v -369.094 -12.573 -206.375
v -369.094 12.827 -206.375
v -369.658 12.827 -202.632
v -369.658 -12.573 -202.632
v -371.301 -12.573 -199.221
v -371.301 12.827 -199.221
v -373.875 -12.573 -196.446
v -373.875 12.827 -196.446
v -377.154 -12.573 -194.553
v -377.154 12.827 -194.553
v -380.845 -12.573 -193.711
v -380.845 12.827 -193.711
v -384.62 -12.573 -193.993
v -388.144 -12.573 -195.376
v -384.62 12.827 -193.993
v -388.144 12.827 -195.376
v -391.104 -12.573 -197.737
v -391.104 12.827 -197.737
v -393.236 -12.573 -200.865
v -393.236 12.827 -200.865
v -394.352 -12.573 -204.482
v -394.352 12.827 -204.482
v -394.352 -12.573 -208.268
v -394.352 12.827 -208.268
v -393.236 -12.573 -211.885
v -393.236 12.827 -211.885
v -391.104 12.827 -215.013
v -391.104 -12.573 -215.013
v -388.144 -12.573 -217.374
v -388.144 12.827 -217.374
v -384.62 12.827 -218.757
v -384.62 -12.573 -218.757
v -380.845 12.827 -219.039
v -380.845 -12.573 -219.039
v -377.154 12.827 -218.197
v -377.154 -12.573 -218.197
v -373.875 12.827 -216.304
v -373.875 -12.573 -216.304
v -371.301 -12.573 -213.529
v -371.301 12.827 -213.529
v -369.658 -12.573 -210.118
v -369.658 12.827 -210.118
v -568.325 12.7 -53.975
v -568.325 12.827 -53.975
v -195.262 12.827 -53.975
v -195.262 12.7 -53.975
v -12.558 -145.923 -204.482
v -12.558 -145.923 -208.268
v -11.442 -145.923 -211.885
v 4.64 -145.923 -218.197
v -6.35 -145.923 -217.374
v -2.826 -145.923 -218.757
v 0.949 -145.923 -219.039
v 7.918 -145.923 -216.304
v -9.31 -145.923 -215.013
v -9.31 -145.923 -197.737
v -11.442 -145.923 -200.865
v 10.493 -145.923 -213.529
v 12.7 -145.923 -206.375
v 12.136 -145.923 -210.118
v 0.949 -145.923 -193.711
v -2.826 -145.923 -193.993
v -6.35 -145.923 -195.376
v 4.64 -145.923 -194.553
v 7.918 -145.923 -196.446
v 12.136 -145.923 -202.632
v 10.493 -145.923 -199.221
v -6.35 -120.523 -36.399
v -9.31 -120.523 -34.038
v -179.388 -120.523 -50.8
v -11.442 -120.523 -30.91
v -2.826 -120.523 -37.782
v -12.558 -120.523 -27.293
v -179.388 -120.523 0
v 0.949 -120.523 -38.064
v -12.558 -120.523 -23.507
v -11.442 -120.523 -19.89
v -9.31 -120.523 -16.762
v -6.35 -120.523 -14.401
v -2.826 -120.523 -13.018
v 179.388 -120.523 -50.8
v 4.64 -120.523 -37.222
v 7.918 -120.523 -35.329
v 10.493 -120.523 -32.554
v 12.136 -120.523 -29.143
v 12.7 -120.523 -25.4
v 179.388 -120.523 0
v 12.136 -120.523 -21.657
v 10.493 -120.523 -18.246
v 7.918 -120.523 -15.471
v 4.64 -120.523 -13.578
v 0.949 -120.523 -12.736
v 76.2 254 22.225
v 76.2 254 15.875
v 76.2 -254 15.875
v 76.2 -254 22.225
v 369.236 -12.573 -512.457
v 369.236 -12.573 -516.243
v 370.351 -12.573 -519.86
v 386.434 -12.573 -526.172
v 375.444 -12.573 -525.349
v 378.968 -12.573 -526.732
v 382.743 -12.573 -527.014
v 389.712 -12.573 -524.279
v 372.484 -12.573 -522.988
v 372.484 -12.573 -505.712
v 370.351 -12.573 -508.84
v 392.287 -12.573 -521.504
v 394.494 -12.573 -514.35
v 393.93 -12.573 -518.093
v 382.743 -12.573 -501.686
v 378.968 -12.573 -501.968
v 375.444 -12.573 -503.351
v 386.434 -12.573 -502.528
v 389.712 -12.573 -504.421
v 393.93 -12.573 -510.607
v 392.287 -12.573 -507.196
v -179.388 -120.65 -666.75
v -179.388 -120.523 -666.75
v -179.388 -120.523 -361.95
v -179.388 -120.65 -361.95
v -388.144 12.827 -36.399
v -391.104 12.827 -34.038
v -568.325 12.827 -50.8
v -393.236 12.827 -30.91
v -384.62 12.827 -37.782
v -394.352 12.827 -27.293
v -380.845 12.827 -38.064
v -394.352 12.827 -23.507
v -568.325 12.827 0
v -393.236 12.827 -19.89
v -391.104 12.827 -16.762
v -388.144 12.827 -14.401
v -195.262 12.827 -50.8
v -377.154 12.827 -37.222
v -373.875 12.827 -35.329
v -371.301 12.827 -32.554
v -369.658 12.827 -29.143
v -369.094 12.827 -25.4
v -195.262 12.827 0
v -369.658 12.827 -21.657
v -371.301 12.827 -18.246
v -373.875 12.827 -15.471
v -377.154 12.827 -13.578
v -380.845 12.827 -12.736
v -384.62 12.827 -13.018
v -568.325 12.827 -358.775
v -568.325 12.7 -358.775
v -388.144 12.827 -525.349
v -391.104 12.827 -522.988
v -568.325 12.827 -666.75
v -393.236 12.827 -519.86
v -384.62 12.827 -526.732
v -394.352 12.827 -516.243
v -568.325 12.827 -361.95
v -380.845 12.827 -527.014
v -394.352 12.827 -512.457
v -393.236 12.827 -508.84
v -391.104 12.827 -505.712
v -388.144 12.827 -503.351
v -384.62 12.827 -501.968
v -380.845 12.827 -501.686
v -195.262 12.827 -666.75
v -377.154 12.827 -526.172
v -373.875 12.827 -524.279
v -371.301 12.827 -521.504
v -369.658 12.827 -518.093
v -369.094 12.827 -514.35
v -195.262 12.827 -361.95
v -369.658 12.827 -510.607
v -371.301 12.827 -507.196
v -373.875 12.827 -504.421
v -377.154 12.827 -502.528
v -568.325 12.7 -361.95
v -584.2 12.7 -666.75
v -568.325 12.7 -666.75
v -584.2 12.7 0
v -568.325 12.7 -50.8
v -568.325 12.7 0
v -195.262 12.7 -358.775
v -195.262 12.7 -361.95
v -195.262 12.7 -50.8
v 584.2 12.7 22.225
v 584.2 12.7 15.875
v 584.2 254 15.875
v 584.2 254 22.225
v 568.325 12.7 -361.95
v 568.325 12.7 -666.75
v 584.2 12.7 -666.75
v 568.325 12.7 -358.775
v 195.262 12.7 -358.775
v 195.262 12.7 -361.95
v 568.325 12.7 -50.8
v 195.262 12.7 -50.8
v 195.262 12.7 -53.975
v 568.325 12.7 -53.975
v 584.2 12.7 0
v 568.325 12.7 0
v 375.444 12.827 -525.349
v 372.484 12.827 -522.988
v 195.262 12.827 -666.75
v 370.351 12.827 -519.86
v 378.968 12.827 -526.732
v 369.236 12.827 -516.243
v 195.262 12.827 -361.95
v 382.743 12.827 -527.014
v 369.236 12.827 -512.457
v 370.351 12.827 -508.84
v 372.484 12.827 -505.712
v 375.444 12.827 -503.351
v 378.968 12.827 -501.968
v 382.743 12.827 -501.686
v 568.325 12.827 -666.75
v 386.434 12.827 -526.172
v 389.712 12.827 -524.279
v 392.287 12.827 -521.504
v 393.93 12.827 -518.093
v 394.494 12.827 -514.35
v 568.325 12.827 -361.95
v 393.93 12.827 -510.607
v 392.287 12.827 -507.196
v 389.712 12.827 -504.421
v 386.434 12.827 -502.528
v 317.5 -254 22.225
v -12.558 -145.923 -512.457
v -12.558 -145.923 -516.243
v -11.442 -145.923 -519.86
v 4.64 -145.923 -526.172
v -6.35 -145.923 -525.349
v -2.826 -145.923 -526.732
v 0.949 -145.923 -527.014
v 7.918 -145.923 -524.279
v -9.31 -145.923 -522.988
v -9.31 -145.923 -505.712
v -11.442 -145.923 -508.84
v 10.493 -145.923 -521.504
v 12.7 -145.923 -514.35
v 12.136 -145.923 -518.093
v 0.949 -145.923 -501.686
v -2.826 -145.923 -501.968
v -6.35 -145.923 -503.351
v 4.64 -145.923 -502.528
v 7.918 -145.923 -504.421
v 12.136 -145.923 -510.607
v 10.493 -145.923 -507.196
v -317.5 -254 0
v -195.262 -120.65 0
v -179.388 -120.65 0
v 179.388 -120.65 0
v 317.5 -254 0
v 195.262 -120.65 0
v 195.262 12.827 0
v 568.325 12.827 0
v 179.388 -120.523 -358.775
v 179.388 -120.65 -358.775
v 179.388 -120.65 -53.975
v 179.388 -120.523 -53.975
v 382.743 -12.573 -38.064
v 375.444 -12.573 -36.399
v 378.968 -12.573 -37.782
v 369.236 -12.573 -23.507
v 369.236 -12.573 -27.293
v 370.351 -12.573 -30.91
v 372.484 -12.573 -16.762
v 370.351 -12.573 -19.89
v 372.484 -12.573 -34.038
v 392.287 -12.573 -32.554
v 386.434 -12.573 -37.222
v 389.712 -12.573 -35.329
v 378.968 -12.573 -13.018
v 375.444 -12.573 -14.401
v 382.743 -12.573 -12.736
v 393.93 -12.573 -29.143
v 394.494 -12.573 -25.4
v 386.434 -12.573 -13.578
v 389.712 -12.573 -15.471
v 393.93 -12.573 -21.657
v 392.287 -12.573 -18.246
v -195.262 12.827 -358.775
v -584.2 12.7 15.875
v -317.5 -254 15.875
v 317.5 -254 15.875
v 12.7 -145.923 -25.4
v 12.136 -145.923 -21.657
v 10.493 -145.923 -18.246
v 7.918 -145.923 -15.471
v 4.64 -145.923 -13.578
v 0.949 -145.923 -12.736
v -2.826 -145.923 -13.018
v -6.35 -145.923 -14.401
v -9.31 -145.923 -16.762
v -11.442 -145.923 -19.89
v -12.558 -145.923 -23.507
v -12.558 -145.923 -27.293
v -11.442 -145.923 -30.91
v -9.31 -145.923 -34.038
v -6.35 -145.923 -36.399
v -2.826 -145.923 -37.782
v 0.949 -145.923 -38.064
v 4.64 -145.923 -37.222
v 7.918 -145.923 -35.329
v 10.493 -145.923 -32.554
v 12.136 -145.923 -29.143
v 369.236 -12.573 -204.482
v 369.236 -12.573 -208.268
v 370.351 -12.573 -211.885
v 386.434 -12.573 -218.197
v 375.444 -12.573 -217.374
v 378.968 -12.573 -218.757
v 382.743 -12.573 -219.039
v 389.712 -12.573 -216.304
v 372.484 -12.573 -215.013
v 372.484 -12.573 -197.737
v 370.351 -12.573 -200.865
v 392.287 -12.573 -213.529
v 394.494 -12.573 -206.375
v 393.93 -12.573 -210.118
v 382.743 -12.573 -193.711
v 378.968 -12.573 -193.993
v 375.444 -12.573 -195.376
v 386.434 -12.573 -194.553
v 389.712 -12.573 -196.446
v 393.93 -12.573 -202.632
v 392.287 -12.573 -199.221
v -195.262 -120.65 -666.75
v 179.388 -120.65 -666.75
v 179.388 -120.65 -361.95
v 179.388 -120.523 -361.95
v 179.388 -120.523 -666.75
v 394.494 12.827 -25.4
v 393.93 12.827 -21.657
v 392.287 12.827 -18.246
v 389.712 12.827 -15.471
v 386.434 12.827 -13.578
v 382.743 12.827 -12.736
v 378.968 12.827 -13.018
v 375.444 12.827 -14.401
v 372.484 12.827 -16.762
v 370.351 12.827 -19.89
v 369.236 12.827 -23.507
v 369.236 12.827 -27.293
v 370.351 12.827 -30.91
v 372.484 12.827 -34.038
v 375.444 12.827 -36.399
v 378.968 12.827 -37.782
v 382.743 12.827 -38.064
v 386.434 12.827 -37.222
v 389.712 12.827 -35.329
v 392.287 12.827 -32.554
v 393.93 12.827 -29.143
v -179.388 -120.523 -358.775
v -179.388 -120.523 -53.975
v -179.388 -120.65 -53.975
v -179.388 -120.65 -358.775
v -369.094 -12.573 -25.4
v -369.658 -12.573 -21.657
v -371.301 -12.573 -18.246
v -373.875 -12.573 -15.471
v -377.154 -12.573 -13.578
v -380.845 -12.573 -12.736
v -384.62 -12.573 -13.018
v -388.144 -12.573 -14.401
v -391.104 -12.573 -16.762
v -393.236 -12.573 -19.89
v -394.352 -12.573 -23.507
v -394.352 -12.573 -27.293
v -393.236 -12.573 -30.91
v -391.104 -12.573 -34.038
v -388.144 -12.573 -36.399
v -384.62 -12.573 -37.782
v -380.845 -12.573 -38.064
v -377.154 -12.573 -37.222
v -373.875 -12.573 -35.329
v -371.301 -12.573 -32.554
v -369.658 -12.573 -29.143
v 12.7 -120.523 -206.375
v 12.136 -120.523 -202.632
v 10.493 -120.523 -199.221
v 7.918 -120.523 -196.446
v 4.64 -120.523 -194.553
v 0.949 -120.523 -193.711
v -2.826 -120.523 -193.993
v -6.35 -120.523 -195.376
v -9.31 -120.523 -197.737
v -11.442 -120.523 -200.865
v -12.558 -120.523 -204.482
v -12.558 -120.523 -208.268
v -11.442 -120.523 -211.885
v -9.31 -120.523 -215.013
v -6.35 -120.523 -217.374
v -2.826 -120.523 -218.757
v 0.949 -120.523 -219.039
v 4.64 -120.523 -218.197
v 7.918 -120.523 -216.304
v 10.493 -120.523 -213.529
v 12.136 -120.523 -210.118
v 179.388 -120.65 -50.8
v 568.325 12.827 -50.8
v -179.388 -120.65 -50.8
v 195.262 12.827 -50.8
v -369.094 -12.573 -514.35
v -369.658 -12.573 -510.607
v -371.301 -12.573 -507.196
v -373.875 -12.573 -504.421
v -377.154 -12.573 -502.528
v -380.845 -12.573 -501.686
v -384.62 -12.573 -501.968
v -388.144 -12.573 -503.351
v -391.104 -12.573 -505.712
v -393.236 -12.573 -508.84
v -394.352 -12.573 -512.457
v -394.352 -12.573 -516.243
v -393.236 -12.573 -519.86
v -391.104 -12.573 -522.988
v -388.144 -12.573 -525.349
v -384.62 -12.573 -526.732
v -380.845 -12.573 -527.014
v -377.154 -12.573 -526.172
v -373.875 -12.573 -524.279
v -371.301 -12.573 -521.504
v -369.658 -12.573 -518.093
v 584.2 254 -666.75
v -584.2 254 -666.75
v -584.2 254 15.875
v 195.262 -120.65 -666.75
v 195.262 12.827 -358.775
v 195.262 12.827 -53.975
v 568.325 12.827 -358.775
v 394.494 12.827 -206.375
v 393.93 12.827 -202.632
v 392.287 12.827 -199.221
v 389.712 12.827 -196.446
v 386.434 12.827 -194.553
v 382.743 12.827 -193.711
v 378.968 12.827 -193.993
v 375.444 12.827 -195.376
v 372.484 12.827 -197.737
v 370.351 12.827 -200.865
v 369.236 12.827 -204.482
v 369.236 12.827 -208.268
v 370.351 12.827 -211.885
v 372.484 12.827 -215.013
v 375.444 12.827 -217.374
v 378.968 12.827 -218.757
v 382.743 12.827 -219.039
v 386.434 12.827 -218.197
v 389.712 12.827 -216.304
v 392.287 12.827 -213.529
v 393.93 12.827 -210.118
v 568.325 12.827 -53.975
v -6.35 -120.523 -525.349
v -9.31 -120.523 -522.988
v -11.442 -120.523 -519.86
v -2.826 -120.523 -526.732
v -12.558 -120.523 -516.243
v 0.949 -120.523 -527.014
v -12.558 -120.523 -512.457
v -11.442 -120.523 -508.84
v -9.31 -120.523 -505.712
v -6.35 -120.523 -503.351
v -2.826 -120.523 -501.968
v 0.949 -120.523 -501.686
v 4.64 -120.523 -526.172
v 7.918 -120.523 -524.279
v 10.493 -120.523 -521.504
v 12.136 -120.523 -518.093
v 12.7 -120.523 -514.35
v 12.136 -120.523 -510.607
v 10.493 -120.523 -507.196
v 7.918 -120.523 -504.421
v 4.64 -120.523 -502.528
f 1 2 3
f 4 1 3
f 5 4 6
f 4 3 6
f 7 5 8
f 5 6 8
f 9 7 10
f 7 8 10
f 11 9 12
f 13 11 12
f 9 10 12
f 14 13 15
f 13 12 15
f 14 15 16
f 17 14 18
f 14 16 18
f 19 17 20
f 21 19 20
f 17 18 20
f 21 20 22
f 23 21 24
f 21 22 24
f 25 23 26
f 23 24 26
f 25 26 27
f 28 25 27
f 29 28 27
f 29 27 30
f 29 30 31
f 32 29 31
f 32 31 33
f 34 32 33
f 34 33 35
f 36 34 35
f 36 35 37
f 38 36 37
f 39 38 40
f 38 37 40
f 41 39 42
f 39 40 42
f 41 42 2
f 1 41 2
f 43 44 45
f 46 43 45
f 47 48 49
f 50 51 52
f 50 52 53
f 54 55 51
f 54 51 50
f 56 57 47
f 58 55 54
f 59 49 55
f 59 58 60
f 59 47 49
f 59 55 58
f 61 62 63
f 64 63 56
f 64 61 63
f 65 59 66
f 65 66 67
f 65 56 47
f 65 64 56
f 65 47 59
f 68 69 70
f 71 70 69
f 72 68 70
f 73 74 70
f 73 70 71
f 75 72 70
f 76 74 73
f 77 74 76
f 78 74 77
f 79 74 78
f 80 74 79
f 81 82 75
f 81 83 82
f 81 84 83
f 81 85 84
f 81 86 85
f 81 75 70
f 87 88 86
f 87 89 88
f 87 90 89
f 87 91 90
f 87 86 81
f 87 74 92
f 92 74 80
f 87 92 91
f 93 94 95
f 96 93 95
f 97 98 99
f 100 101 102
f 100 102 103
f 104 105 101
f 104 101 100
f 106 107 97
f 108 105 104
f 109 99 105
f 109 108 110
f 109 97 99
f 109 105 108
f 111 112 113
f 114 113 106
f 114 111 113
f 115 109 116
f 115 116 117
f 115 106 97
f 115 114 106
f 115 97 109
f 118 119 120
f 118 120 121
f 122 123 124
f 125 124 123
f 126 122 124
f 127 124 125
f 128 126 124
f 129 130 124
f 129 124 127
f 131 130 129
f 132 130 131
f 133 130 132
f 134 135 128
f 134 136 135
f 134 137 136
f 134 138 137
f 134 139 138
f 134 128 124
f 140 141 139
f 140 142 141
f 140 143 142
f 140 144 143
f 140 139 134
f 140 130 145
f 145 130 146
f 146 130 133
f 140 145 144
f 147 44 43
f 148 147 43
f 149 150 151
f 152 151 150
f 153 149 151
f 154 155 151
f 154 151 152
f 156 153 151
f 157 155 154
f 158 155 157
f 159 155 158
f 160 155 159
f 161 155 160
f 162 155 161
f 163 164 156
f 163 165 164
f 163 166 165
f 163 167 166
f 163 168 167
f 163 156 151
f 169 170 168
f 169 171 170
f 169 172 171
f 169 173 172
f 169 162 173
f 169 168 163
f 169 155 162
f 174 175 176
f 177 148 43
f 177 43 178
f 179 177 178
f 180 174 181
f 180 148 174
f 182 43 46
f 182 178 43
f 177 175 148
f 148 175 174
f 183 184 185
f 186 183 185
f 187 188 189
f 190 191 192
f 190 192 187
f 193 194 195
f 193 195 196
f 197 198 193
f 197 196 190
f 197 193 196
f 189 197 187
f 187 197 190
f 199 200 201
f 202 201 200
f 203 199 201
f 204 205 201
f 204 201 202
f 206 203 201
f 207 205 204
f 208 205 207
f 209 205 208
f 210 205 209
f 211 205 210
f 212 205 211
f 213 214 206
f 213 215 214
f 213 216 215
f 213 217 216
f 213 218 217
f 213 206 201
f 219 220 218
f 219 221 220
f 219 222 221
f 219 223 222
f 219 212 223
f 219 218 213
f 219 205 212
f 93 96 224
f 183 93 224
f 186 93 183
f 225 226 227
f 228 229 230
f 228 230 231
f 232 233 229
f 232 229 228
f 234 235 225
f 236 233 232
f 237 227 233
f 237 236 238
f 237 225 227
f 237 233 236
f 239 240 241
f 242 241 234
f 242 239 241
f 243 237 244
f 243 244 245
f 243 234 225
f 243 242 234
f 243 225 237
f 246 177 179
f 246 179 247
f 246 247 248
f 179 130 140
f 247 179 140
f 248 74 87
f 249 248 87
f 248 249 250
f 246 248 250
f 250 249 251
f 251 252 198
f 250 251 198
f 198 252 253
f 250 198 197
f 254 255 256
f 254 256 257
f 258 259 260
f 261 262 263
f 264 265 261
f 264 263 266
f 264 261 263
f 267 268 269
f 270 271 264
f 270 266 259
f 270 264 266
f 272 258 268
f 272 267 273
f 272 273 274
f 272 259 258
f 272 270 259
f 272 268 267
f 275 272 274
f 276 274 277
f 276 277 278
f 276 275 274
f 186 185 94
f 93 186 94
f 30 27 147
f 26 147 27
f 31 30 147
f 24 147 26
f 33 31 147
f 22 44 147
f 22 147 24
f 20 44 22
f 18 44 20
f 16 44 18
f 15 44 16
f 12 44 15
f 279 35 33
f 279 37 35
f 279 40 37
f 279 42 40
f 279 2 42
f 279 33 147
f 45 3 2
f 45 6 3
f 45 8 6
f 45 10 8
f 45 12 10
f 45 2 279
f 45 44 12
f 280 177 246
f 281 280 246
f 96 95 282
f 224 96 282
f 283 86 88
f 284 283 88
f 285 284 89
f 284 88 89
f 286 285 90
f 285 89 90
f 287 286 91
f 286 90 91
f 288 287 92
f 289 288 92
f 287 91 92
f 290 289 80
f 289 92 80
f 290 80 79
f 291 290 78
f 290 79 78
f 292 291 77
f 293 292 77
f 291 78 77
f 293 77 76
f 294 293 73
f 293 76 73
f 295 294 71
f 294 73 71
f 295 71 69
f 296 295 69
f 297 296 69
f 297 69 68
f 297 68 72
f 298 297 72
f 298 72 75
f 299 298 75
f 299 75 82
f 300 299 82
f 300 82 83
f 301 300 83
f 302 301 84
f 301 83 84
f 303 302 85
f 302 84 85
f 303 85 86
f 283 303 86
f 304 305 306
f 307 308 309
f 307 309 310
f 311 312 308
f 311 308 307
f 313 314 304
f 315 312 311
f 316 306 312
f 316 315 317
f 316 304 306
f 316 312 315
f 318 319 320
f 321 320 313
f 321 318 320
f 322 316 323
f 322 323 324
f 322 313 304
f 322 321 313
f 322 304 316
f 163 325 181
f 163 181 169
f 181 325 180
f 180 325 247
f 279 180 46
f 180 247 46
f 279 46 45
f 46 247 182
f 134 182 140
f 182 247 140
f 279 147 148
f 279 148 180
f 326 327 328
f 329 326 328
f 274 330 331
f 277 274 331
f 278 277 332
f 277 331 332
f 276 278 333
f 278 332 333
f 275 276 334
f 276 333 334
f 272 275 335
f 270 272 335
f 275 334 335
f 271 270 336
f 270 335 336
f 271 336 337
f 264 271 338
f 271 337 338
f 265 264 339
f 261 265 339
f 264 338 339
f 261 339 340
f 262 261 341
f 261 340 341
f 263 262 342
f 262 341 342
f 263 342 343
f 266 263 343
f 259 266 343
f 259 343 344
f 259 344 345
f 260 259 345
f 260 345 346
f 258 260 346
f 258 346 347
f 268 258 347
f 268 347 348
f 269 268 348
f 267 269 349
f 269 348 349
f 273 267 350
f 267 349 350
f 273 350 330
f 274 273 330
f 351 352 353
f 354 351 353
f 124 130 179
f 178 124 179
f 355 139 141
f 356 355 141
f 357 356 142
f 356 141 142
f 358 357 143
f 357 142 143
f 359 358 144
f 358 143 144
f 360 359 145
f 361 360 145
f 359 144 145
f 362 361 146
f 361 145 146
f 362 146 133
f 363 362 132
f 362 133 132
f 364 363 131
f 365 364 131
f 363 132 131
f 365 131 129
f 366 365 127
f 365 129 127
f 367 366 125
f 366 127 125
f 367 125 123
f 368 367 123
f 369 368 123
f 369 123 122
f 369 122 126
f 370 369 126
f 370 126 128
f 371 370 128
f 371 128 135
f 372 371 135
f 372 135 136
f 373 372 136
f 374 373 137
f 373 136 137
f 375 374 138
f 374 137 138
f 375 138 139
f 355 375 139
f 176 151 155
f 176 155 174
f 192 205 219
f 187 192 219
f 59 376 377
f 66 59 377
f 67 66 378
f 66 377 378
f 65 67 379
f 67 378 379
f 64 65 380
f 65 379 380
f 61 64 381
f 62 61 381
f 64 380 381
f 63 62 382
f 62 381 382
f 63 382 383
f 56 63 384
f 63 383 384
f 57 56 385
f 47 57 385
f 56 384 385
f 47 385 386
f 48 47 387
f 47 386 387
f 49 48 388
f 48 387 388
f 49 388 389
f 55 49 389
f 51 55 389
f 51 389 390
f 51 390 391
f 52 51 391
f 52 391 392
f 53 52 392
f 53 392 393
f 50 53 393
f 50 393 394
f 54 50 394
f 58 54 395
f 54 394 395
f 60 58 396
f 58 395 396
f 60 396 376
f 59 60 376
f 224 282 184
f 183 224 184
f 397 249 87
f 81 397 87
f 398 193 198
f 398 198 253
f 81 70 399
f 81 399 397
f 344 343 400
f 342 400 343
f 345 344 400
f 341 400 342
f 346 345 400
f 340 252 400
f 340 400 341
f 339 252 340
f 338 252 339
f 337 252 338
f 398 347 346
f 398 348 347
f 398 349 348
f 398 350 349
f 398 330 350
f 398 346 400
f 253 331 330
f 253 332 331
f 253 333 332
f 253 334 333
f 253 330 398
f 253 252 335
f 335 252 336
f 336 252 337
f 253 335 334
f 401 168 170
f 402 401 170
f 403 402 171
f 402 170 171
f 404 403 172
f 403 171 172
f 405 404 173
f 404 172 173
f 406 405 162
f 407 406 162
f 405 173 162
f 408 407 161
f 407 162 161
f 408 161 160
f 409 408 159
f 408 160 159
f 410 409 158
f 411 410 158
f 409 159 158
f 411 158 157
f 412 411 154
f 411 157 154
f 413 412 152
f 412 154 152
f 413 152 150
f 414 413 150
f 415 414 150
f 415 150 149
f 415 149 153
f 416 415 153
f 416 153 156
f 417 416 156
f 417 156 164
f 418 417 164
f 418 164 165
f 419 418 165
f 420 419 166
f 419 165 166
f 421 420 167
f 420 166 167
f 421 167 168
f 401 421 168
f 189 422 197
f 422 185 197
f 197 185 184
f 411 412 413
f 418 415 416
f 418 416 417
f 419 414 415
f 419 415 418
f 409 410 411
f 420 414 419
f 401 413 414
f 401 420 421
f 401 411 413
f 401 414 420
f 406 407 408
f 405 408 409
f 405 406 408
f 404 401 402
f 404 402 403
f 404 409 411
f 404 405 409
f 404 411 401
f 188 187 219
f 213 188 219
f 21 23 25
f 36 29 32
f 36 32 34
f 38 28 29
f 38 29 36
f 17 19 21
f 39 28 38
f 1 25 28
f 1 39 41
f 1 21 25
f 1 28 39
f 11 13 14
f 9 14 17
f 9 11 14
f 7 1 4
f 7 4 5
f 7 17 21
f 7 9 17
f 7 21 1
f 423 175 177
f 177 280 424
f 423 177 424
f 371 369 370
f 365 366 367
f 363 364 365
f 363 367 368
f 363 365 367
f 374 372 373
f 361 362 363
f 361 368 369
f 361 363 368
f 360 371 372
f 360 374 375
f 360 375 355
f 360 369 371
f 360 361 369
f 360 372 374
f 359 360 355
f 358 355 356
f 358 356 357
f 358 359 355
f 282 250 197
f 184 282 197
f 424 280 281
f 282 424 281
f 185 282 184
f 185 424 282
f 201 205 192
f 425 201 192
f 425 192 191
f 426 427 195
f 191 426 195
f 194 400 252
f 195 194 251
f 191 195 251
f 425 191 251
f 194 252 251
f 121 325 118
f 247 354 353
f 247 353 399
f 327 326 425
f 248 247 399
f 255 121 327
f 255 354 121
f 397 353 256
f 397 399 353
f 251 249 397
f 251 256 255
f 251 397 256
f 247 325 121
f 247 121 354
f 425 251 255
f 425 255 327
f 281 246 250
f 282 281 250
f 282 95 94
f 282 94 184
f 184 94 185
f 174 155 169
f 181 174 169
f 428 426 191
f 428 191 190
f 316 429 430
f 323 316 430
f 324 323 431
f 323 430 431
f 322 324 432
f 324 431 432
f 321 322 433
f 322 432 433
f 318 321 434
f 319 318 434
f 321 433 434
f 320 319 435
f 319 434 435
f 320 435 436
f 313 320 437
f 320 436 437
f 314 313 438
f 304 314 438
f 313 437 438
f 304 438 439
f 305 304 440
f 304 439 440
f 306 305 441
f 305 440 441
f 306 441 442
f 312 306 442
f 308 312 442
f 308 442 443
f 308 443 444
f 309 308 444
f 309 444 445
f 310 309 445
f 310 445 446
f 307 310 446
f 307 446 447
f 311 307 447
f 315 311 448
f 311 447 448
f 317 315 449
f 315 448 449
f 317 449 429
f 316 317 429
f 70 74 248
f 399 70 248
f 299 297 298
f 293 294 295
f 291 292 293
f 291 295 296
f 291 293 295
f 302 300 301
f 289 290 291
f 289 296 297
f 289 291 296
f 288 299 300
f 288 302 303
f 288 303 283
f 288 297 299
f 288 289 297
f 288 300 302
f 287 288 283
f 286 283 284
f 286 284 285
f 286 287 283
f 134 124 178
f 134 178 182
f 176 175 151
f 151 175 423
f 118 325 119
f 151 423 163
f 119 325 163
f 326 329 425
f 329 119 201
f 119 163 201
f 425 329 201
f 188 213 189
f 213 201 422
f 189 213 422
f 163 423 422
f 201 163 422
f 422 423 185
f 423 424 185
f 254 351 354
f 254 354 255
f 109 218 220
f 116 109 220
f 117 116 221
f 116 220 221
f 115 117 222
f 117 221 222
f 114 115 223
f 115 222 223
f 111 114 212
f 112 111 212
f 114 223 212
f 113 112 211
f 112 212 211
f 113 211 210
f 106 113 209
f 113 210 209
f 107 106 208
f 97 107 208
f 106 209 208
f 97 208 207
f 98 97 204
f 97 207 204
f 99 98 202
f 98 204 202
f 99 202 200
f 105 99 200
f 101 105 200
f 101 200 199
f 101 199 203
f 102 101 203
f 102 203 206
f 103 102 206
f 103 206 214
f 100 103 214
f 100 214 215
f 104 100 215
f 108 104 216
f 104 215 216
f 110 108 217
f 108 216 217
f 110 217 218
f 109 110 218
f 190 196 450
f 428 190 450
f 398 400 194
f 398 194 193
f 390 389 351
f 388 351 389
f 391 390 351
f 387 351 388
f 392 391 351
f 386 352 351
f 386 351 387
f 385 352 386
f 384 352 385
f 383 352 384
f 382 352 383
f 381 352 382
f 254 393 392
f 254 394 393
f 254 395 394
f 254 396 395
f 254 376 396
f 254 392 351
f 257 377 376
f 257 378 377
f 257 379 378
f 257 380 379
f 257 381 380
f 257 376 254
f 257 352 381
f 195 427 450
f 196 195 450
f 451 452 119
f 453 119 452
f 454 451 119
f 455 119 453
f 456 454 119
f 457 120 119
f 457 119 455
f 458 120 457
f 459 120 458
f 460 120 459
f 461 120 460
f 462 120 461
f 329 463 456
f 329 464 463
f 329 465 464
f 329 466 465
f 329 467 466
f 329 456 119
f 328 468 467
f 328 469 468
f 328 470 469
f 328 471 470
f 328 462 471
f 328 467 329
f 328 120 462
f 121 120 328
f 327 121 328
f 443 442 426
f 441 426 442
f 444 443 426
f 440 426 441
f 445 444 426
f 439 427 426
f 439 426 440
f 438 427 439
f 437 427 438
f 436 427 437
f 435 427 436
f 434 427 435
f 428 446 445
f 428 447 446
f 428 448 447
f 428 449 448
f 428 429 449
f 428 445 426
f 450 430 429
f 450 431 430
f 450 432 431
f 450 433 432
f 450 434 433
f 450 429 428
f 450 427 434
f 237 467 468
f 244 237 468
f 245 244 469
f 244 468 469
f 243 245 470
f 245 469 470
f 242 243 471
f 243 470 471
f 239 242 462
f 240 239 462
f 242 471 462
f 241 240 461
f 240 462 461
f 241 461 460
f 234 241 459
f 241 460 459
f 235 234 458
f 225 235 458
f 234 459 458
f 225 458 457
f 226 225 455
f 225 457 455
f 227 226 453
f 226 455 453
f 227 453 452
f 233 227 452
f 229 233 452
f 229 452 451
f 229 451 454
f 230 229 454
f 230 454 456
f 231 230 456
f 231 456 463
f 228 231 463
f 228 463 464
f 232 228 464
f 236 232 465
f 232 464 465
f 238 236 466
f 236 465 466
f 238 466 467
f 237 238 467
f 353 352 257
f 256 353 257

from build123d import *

# Parameters (mm, degrees)
F1_DEPTH  = 15.875
F3_DEPTH  = 666.75
F4_W      = 373.0625
F4_H      = 304.8
F4_H_2    = 50.8
F5_DEPTH  = 225.298
F6_W      = 373.0625
F6_H      = 304.8
F6_H_2    = 50.8
F7_DEPTH  = 225.298
F8_W      = 358.775
F8_H      = 304.8
F8_H_2    = 50.8
F9_DEPTH  = 358.648
F10_R     = 12.7
F11_DEPTH = 25.4
F12_R     = 12.7
F13_DEPTH = 25.4
F14_R     = 12.7
F15_DEPTH = 25.4
F16_R     = 12.7
F17_DEPTH = 25.4
F18_R     = 12.7
F19_DEPTH = 25.4
F20_R     = 12.7
F21_DEPTH = 25.4
F22_R     = 12.7
F23_DEPTH = 25.4
F24_R     = 12.7
F25_DEPTH = 25.4
F26_R     = 12.7
F27_DEPTH = 25.4
F29_DEPTH = 6.35
F30_W     = 358.775
F30_H     = 3.175
F31_DEPTH = 358.775
F32_W     = 358.775
F32_H     = 3.175
F33_DEPTH = 358.775
F34_W     = 373.0625
F34_H     = 3.175
F35_DEPTH = 225.425
F36_W     = 373.0625
F36_H     = 3.175
F37_DEPTH = 225.425
F38_W     = 373.0625
F38_H     = 3.175
F39_DEPTH = 225.425
F40_W     = 373.0625
F40_H     = 3.175
F41_DEPTH = 225.425


with BuildPart() as f1:
    # F0 (on Top) → F1 (new body)
    with BuildSketch(Plane.XY):
        Polygon((584.2, 254), (-584.2, 254), (-584.2, 12.7), (-317.5, -254), (317.5, -254), (584.2, 12.7), align=None)
    extrude(amount=F1_DEPTH)

    # F2 (on face) → F3 (join)
    with BuildSketch(Plane(origin=(0, 0, 0), x_dir=(1, 0, 0), z_dir=(0, 0, -1))):
        Polygon((-568.325, -12.7), (-584.2, -12.7), (-584.2, -254), (-568.325, -254), (568.325, -254), (584.2, -254), (584.2, -12.7), (568.325, -12.7), (568.325, -238.125), (195.2625, -238.125), (179.3875, -238.125), (-179.3875, -238.125), (-195.2625, -238.125), (-568.325, -238.125), align=None)
        Polygon((-195.2625, 120.65), (-195.2625, -238.125), (-179.3875, -238.125), (-179.3875, 120.65), (-187.325, 120.65), align=None)
        Polygon((179.3875, 120.65), (179.3875, -238.125), (195.2625, -238.125), (195.2625, 120.65), (187.325, 120.65), align=None)
    extrude(amount=F3_DEPTH)

    # F4 (on face) → F5 (join)
    with BuildSketch(Plane.XZ.offset(-238.125)):
        with Locations((-381.79375, -514.35)):
            Rectangle(F4_W, F4_H)
        with Locations((-381.79375, -206.375)):
            Rectangle(F4_W, F4_H)
        with Locations((-381.79375, -25.4)):
            Rectangle(F4_W, F4_H_2)
    extrude(amount=F5_DEPTH)

    # F6 (on face) → F7 (join)
    with BuildSketch(Plane.XZ.offset(-238.125)):
        with Locations((381.79375, -514.35)):
            Rectangle(F6_W, F6_H)
        with Locations((381.79375, -206.375)):
            Rectangle(F6_W, F6_H)
        with Locations((381.79375, -25.4)):
            Rectangle(F6_W, F6_H_2)
    extrude(amount=F7_DEPTH)

    # F8 (on face) → F9 (join)
    with BuildSketch(Plane.XZ.offset(-238.125)):
        with Locations((0, -514.35)):
            Rectangle(F8_W, F8_H)
        with Locations((0, -206.375)):
            Rectangle(F8_W, F8_H)
        with Locations((0, -25.4)):
            Rectangle(F8_W, F8_H_2)
    extrude(amount=F9_DEPTH)

    # F10 (on face) → F11 (join)
    with BuildSketch(Plane.XZ.offset(-12.827)):
        with Locations((-381.79375, -514.35)):
            Circle(F10_R)
    extrude(amount=F11_DEPTH)

    # F12 (on face) → F13 (join)
    with BuildSketch(Plane.XZ.offset(-12.827)):
        with Locations((-381.79375, -206.375)):
            Circle(F12_R)
    extrude(amount=F13_DEPTH)

    # F14 (on face) → F15 (join)
    with BuildSketch(Plane.XZ.offset(-12.827)):
        with Locations((-381.79375, -25.4)):
            Circle(F14_R)
    extrude(amount=F15_DEPTH)

    # F16 (on face) → F17 (join)
    with BuildSketch(Plane.XZ.offset(120.523)):
        with Locations((0, -514.35)):
            Circle(F16_R)
    extrude(amount=F17_DEPTH)

    # F18 (on face) → F19 (join)
    with BuildSketch(Plane.XZ.offset(120.523)):
        with Locations((0, -206.375)):
            Circle(F18_R)
    extrude(amount=F19_DEPTH)

    # F20 (on face) → F21 (join)
    with BuildSketch(Plane.XZ.offset(120.523)):
        with Locations((0, -25.4)):
            Circle(F20_R)
    extrude(amount=F21_DEPTH)

    # F22 (on face) → F23 (join)
    with BuildSketch(Plane.XZ.offset(-12.827)):
        with Locations((381.79375, -514.35)):
            Circle(F22_R)
    extrude(amount=F23_DEPTH)

    # F24 (on face) → F25 (join)
    with BuildSketch(Plane.XZ.offset(-12.827)):
        with Locations((381.79375, -206.375)):
            Circle(F24_R)
    extrude(amount=F25_DEPTH)

    # F26 (on face) → F27 (join)
    with BuildSketch(Plane.XZ.offset(-12.827)):
        with Locations((381.79375, -25.4)):
            Circle(F26_R)
    extrude(amount=F27_DEPTH)

    # F30 (on face) → F31 (join)
    with BuildSketch(Plane.XZ.offset(-238.125)):
        with Locations((0, -360.3625)):
            Rectangle(F30_W, F30_H)
    extrude(amount=F31_DEPTH)

    # F32 (on face) → F33 (join)
    with BuildSketch(Plane.XZ.offset(-238.125)):
        with Locations((0, -52.3875)):
            Rectangle(F32_W, F32_H)
    extrude(amount=F33_DEPTH)

    # F34 (on face) → F35 (join)
    with BuildSketch(Plane.XZ.offset(-238.125)):
        with Locations((-381.79375, -360.3625)):
            Rectangle(F34_W, F34_H)
    extrude(amount=F35_DEPTH)

    # F36 (on face) → F37 (join)
    with BuildSketch(Plane.XZ.offset(-238.125)):
        with Locations((-381.79375, -52.3875)):
            Rectangle(F36_W, F36_H)
    extrude(amount=F37_DEPTH)

    # F38 (on face) → F39 (join)
    with BuildSketch(Plane.XZ.offset(-238.125)):
        with Locations((381.79375, -52.3875)):
            Rectangle(F38_W, F38_H)
    extrude(amount=F39_DEPTH)

    # F40 (on face) → F41 (join)
    with BuildSketch(Plane.XZ.offset(-238.125)):
        with Locations((381.79375, -360.3625)):
            Rectangle(F40_W, F40_H)
    extrude(amount=F41_DEPTH)


with BuildPart() as f29:
    # F28 (on face) → F29 (new body)
    with BuildSketch(Plane.XY.offset(15.875)):
        Polygon((584.2, 12.7), (584.2, 254), (76.2, 254), (76.2, -254), (317.5, -254), align=None)
    extrude(amount=F29_DEPTH)


solid = Compound([f1.part, f29.part])
